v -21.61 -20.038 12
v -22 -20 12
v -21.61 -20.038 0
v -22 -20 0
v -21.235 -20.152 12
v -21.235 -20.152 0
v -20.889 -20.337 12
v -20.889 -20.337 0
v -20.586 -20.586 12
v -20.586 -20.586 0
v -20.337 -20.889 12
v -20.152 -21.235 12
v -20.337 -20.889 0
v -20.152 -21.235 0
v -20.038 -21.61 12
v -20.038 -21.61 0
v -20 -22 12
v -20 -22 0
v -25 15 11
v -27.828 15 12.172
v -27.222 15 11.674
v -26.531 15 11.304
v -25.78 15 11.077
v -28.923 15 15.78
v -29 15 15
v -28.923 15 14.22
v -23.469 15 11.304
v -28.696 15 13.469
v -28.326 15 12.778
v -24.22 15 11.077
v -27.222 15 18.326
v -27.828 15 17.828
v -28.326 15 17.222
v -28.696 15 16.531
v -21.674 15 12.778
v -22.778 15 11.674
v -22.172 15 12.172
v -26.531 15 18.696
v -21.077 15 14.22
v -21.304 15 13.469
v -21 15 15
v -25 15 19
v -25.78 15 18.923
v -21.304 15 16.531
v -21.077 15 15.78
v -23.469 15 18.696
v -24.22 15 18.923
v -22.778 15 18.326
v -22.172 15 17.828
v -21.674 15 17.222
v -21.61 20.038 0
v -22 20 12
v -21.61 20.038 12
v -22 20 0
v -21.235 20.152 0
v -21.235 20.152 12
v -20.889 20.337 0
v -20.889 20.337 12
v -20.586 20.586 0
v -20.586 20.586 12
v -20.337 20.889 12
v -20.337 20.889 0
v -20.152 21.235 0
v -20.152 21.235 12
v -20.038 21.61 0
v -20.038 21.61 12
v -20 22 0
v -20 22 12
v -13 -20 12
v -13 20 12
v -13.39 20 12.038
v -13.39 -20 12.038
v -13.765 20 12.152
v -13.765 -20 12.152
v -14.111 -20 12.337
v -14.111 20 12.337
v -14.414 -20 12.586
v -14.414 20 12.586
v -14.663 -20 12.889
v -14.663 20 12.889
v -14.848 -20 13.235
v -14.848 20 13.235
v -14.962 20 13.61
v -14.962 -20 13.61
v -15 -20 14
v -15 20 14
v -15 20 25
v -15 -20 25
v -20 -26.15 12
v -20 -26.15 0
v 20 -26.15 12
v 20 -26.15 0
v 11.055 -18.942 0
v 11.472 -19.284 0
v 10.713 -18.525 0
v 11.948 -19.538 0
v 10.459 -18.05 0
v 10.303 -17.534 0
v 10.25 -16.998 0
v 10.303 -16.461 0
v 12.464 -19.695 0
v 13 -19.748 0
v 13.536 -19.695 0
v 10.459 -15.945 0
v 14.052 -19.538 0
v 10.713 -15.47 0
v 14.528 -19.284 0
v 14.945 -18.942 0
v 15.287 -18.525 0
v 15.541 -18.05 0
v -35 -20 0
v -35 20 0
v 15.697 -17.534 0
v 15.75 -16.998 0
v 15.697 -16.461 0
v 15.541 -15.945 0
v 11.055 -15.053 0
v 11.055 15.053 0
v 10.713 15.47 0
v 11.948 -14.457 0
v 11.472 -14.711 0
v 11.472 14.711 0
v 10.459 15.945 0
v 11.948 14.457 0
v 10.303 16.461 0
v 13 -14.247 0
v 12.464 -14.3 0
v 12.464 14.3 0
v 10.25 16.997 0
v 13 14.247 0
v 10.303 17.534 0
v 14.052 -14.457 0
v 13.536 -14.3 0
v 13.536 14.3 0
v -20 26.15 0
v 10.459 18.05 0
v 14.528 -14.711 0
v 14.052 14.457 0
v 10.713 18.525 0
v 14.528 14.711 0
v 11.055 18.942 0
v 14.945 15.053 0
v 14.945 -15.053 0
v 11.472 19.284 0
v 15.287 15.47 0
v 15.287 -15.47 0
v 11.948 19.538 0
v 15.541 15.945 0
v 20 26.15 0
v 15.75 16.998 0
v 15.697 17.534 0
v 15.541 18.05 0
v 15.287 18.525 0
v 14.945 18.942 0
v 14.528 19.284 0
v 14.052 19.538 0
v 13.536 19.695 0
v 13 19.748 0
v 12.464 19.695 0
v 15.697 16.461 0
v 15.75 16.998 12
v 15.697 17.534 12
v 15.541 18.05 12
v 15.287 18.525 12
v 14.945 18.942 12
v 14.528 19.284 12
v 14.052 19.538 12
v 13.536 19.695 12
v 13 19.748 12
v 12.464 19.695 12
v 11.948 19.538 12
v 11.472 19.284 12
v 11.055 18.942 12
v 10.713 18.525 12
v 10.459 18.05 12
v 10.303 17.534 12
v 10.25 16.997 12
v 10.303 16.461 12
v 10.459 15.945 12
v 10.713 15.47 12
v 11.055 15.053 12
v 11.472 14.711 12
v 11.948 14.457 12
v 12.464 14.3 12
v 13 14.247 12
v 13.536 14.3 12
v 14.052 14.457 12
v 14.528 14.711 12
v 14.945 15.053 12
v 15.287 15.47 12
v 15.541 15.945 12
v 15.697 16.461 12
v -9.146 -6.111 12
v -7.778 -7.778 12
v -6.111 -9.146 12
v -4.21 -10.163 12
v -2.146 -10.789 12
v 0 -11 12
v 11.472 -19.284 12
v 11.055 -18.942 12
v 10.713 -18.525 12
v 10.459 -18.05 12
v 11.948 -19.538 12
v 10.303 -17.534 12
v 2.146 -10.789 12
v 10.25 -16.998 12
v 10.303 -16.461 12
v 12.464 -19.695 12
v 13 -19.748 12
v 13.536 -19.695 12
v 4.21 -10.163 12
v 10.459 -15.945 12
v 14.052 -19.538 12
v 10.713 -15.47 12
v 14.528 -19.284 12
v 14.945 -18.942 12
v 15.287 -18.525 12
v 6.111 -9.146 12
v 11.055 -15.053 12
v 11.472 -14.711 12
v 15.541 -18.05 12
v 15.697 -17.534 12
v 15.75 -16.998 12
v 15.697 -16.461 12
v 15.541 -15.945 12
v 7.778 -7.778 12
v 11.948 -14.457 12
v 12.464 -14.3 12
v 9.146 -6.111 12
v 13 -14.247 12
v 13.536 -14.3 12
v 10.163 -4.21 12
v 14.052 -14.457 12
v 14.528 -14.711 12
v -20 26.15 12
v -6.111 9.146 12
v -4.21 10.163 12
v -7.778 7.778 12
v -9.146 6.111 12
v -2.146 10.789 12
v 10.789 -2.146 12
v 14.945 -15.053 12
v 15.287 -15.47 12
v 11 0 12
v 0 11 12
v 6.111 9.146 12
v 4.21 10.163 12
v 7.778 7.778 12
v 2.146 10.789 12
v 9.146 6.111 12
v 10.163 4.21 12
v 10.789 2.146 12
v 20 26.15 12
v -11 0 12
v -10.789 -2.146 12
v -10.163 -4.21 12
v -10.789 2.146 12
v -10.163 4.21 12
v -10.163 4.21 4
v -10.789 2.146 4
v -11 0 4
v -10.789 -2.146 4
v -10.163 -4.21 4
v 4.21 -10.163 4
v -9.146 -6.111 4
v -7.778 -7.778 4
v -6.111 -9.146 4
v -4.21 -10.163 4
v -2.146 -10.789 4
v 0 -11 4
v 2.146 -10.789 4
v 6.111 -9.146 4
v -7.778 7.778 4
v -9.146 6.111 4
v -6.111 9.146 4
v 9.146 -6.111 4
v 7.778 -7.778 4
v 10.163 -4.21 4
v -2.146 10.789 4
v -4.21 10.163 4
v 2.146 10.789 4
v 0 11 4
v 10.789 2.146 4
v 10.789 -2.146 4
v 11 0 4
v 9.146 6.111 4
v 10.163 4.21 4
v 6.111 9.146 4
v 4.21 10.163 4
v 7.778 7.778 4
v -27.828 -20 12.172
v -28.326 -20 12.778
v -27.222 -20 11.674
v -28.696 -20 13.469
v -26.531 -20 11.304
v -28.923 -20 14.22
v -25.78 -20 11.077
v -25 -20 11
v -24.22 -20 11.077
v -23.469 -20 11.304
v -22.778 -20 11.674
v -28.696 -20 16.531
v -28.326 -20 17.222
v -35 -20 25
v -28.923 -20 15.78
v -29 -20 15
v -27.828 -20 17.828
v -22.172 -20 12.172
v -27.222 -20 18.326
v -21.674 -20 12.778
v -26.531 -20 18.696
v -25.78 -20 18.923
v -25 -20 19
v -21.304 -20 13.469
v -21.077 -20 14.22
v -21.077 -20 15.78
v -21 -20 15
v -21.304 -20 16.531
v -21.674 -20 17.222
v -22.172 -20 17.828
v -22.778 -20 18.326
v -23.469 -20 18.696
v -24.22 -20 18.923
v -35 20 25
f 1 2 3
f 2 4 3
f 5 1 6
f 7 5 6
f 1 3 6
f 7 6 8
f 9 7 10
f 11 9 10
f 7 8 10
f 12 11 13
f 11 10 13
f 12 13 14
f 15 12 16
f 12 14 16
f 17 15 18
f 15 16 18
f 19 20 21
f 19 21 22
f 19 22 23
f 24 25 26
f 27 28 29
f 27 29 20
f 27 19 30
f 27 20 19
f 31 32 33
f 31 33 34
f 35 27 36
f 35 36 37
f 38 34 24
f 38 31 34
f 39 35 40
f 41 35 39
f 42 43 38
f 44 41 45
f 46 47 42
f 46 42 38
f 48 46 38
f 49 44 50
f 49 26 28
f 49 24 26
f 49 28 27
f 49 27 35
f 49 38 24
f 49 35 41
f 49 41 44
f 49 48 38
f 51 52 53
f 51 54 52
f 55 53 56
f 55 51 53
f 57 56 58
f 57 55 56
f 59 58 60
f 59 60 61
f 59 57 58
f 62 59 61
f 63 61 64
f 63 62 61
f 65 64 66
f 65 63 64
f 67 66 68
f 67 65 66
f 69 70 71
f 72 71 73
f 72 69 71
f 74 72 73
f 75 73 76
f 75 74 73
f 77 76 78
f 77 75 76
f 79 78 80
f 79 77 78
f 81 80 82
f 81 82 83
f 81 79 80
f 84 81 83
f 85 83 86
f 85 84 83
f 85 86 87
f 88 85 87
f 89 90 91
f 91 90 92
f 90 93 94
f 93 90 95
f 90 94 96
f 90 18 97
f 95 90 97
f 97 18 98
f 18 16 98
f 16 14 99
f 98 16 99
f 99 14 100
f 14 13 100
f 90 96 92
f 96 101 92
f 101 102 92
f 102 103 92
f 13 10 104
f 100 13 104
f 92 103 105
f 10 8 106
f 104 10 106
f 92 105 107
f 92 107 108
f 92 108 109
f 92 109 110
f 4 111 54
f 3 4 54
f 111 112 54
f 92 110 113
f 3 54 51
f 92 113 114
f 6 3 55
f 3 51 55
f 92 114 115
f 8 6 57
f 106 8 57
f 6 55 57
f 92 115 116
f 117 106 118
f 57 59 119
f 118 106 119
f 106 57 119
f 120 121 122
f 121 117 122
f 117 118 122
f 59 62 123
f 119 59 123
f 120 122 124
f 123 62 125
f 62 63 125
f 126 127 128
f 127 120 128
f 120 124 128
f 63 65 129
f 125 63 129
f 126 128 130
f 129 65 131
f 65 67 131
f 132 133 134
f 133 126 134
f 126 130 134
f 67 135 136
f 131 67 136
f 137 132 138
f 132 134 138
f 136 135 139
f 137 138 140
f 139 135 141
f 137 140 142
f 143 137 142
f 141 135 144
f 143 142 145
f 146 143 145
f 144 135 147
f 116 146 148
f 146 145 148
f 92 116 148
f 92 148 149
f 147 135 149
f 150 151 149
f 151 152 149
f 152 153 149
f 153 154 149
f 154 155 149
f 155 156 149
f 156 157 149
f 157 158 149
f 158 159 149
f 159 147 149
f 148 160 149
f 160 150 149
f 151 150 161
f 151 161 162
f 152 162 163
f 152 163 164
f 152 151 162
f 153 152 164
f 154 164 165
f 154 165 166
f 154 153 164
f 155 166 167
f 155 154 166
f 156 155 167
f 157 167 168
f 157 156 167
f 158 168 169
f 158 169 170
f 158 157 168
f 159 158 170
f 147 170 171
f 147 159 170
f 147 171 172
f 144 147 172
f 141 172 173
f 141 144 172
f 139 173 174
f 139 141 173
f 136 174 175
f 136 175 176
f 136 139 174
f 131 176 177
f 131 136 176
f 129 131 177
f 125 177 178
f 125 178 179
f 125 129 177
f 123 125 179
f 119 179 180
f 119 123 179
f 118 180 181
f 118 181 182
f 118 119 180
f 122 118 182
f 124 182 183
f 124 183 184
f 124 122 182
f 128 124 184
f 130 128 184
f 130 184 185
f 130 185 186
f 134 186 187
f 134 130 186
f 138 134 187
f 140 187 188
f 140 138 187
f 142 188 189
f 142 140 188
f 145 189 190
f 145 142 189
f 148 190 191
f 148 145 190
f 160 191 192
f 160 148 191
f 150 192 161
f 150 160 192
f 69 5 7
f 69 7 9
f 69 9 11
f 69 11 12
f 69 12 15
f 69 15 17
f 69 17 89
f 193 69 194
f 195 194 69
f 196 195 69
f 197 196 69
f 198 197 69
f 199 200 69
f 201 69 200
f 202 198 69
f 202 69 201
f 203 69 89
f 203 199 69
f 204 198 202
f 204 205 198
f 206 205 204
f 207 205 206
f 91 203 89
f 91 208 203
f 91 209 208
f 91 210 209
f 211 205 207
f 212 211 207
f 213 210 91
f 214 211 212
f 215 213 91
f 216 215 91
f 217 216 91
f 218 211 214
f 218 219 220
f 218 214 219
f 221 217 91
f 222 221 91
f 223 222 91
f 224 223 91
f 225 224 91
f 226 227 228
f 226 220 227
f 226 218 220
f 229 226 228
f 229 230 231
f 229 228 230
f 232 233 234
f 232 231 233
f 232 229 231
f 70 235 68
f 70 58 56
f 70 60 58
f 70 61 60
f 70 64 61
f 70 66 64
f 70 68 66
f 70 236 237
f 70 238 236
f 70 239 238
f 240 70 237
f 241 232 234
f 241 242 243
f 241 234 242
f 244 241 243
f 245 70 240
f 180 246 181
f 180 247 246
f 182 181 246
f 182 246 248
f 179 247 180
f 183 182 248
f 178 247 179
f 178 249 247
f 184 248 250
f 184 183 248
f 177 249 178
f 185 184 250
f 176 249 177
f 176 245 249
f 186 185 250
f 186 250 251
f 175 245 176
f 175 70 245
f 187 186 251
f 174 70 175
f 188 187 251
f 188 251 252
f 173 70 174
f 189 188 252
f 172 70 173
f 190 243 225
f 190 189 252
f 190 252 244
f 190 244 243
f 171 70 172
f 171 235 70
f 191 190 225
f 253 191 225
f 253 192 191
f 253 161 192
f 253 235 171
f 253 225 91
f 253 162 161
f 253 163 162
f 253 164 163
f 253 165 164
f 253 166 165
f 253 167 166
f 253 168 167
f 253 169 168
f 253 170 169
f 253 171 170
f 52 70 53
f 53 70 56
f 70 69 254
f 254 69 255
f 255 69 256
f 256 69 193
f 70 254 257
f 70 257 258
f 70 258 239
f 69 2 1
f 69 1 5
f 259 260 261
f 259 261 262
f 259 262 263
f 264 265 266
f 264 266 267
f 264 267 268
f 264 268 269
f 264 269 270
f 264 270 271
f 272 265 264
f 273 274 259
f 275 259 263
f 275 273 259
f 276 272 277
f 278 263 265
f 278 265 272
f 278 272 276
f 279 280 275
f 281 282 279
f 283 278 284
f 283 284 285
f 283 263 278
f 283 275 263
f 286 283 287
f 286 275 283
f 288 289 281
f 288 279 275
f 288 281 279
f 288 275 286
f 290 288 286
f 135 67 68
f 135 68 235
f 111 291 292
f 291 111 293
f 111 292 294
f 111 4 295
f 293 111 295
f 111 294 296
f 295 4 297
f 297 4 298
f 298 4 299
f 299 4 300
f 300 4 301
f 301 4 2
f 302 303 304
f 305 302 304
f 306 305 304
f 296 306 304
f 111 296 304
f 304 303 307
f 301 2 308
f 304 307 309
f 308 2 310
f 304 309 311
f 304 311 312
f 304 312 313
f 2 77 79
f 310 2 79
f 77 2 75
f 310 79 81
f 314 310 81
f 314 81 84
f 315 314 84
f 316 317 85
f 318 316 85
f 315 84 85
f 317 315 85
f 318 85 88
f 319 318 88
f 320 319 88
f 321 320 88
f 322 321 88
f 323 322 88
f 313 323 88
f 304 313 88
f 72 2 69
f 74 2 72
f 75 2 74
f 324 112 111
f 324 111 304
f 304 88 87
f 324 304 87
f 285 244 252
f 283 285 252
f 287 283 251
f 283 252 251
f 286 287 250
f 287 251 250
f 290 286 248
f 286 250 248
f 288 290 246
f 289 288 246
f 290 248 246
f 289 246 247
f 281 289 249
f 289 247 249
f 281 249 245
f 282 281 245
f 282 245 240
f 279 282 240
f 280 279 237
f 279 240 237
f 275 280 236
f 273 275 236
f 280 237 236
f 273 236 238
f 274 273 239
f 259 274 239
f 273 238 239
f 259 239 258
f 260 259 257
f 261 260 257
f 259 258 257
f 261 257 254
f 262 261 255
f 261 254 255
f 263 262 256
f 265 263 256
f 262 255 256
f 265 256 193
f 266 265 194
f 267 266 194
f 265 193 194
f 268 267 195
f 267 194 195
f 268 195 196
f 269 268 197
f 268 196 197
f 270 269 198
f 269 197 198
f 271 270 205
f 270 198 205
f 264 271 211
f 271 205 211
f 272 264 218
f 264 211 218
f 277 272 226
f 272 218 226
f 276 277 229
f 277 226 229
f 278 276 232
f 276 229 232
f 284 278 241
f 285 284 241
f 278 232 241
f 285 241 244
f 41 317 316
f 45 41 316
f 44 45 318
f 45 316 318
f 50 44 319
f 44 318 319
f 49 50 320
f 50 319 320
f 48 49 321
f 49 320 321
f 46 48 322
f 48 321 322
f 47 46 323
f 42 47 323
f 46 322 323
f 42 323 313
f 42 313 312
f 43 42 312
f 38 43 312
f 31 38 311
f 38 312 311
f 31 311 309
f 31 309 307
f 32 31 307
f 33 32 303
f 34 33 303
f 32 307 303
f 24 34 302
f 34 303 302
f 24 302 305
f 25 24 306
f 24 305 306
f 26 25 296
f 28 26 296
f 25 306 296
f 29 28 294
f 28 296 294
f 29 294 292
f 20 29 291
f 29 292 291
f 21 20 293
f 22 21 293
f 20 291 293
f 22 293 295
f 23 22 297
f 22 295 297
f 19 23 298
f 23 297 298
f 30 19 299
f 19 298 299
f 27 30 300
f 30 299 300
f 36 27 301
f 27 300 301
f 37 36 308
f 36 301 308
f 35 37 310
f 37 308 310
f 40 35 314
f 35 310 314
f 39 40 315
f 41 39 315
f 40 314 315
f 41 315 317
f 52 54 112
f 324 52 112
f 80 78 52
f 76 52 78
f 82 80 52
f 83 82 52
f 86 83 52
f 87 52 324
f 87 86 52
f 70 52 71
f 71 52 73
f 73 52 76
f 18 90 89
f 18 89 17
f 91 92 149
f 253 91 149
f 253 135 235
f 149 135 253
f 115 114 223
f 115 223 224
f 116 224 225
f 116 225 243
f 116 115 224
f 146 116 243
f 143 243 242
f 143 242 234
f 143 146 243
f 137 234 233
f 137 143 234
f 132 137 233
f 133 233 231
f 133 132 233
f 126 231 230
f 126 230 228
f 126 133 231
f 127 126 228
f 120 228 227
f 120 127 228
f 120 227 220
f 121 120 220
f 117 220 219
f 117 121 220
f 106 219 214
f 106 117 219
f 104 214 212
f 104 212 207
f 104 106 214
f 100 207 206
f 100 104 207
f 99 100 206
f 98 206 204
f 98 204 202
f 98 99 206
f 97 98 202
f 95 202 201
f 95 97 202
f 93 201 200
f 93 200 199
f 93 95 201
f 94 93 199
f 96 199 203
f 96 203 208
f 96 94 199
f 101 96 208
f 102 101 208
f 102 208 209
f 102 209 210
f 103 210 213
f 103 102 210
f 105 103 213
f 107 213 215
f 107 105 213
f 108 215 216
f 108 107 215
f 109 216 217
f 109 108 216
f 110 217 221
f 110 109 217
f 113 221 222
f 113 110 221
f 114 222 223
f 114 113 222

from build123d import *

# Parameters (mm, degrees)
SKETCH1_W           = 40
SKETCH1_H           = 52.3
SKETCH1_R           = 2.75
BOSS_EXTRUDE1_DEPTH = 12
SKETCH2_R           = 11
CUT_EXTRUDE1_DEPTH  = 8
SKETCH6_W           = 25
SKETCH6_H           = 40
BOSS_EXTRUDE3_DEPTH = 20
FILLET1_R           = 2
FILLET2_R           = 2
SKETCH7_R           = 4
CUT_EXTRUDE2_DEPTH  = 35


with BuildPart() as part:
    # Sketch1 → Boss-Extrude1 (new body)
    with BuildSketch(Plane.XY):
        Rectangle(SKETCH1_W, SKETCH1_H)
        with Locations((13, 16.9975)):
            Circle(SKETCH1_R, mode=Mode.SUBTRACT)
        with Locations((13, -16.9975)):
            Circle(SKETCH1_R, mode=Mode.SUBTRACT)
    extrude(amount=BOSS_EXTRUDE1_DEPTH)

    # Sketch2 → Cut-Extrude1 (cut)
    with BuildSketch(Plane.XY.offset(12)):
        Circle(SKETCH2_R)
    extrude(amount=-CUT_EXTRUDE1_DEPTH, mode=Mode.SUBTRACT)

    # Sketch6 → Boss-Extrude3 (add)
    with BuildSketch(Plane.ZY.offset(15)):
        with Locations((12.5, 0)):
            Rectangle(SKETCH6_W, SKETCH6_H)
    extrude(amount=BOSS_EXTRUDE3_DEPTH)

    # Fillet1
    fillet1_edges = [part.edges().sort_by_distance(p)[0] for p in [
        (-20, 20, 6),
        (-20, -20, 6),
    ]]
    fillet(fillet1_edges, radius=FILLET1_R)

    # Fillet2
    fillet2_edges = [part.edges().sort_by_distance(p)[0] for p in [
        (-15, 0, 12),
    ]]
    fillet(fillet2_edges, radius=FILLET2_R)

    # Sketch7 → Cut-Extrude2 (cut)
    with BuildSketch(Plane.XZ.offset(20)):
        with Locations((-25, 15)):
            Circle(SKETCH7_R)
    extrude(amount=-CUT_EXTRUDE2_DEPTH, mode=Mode.SUBTRACT)


solid = part.part
